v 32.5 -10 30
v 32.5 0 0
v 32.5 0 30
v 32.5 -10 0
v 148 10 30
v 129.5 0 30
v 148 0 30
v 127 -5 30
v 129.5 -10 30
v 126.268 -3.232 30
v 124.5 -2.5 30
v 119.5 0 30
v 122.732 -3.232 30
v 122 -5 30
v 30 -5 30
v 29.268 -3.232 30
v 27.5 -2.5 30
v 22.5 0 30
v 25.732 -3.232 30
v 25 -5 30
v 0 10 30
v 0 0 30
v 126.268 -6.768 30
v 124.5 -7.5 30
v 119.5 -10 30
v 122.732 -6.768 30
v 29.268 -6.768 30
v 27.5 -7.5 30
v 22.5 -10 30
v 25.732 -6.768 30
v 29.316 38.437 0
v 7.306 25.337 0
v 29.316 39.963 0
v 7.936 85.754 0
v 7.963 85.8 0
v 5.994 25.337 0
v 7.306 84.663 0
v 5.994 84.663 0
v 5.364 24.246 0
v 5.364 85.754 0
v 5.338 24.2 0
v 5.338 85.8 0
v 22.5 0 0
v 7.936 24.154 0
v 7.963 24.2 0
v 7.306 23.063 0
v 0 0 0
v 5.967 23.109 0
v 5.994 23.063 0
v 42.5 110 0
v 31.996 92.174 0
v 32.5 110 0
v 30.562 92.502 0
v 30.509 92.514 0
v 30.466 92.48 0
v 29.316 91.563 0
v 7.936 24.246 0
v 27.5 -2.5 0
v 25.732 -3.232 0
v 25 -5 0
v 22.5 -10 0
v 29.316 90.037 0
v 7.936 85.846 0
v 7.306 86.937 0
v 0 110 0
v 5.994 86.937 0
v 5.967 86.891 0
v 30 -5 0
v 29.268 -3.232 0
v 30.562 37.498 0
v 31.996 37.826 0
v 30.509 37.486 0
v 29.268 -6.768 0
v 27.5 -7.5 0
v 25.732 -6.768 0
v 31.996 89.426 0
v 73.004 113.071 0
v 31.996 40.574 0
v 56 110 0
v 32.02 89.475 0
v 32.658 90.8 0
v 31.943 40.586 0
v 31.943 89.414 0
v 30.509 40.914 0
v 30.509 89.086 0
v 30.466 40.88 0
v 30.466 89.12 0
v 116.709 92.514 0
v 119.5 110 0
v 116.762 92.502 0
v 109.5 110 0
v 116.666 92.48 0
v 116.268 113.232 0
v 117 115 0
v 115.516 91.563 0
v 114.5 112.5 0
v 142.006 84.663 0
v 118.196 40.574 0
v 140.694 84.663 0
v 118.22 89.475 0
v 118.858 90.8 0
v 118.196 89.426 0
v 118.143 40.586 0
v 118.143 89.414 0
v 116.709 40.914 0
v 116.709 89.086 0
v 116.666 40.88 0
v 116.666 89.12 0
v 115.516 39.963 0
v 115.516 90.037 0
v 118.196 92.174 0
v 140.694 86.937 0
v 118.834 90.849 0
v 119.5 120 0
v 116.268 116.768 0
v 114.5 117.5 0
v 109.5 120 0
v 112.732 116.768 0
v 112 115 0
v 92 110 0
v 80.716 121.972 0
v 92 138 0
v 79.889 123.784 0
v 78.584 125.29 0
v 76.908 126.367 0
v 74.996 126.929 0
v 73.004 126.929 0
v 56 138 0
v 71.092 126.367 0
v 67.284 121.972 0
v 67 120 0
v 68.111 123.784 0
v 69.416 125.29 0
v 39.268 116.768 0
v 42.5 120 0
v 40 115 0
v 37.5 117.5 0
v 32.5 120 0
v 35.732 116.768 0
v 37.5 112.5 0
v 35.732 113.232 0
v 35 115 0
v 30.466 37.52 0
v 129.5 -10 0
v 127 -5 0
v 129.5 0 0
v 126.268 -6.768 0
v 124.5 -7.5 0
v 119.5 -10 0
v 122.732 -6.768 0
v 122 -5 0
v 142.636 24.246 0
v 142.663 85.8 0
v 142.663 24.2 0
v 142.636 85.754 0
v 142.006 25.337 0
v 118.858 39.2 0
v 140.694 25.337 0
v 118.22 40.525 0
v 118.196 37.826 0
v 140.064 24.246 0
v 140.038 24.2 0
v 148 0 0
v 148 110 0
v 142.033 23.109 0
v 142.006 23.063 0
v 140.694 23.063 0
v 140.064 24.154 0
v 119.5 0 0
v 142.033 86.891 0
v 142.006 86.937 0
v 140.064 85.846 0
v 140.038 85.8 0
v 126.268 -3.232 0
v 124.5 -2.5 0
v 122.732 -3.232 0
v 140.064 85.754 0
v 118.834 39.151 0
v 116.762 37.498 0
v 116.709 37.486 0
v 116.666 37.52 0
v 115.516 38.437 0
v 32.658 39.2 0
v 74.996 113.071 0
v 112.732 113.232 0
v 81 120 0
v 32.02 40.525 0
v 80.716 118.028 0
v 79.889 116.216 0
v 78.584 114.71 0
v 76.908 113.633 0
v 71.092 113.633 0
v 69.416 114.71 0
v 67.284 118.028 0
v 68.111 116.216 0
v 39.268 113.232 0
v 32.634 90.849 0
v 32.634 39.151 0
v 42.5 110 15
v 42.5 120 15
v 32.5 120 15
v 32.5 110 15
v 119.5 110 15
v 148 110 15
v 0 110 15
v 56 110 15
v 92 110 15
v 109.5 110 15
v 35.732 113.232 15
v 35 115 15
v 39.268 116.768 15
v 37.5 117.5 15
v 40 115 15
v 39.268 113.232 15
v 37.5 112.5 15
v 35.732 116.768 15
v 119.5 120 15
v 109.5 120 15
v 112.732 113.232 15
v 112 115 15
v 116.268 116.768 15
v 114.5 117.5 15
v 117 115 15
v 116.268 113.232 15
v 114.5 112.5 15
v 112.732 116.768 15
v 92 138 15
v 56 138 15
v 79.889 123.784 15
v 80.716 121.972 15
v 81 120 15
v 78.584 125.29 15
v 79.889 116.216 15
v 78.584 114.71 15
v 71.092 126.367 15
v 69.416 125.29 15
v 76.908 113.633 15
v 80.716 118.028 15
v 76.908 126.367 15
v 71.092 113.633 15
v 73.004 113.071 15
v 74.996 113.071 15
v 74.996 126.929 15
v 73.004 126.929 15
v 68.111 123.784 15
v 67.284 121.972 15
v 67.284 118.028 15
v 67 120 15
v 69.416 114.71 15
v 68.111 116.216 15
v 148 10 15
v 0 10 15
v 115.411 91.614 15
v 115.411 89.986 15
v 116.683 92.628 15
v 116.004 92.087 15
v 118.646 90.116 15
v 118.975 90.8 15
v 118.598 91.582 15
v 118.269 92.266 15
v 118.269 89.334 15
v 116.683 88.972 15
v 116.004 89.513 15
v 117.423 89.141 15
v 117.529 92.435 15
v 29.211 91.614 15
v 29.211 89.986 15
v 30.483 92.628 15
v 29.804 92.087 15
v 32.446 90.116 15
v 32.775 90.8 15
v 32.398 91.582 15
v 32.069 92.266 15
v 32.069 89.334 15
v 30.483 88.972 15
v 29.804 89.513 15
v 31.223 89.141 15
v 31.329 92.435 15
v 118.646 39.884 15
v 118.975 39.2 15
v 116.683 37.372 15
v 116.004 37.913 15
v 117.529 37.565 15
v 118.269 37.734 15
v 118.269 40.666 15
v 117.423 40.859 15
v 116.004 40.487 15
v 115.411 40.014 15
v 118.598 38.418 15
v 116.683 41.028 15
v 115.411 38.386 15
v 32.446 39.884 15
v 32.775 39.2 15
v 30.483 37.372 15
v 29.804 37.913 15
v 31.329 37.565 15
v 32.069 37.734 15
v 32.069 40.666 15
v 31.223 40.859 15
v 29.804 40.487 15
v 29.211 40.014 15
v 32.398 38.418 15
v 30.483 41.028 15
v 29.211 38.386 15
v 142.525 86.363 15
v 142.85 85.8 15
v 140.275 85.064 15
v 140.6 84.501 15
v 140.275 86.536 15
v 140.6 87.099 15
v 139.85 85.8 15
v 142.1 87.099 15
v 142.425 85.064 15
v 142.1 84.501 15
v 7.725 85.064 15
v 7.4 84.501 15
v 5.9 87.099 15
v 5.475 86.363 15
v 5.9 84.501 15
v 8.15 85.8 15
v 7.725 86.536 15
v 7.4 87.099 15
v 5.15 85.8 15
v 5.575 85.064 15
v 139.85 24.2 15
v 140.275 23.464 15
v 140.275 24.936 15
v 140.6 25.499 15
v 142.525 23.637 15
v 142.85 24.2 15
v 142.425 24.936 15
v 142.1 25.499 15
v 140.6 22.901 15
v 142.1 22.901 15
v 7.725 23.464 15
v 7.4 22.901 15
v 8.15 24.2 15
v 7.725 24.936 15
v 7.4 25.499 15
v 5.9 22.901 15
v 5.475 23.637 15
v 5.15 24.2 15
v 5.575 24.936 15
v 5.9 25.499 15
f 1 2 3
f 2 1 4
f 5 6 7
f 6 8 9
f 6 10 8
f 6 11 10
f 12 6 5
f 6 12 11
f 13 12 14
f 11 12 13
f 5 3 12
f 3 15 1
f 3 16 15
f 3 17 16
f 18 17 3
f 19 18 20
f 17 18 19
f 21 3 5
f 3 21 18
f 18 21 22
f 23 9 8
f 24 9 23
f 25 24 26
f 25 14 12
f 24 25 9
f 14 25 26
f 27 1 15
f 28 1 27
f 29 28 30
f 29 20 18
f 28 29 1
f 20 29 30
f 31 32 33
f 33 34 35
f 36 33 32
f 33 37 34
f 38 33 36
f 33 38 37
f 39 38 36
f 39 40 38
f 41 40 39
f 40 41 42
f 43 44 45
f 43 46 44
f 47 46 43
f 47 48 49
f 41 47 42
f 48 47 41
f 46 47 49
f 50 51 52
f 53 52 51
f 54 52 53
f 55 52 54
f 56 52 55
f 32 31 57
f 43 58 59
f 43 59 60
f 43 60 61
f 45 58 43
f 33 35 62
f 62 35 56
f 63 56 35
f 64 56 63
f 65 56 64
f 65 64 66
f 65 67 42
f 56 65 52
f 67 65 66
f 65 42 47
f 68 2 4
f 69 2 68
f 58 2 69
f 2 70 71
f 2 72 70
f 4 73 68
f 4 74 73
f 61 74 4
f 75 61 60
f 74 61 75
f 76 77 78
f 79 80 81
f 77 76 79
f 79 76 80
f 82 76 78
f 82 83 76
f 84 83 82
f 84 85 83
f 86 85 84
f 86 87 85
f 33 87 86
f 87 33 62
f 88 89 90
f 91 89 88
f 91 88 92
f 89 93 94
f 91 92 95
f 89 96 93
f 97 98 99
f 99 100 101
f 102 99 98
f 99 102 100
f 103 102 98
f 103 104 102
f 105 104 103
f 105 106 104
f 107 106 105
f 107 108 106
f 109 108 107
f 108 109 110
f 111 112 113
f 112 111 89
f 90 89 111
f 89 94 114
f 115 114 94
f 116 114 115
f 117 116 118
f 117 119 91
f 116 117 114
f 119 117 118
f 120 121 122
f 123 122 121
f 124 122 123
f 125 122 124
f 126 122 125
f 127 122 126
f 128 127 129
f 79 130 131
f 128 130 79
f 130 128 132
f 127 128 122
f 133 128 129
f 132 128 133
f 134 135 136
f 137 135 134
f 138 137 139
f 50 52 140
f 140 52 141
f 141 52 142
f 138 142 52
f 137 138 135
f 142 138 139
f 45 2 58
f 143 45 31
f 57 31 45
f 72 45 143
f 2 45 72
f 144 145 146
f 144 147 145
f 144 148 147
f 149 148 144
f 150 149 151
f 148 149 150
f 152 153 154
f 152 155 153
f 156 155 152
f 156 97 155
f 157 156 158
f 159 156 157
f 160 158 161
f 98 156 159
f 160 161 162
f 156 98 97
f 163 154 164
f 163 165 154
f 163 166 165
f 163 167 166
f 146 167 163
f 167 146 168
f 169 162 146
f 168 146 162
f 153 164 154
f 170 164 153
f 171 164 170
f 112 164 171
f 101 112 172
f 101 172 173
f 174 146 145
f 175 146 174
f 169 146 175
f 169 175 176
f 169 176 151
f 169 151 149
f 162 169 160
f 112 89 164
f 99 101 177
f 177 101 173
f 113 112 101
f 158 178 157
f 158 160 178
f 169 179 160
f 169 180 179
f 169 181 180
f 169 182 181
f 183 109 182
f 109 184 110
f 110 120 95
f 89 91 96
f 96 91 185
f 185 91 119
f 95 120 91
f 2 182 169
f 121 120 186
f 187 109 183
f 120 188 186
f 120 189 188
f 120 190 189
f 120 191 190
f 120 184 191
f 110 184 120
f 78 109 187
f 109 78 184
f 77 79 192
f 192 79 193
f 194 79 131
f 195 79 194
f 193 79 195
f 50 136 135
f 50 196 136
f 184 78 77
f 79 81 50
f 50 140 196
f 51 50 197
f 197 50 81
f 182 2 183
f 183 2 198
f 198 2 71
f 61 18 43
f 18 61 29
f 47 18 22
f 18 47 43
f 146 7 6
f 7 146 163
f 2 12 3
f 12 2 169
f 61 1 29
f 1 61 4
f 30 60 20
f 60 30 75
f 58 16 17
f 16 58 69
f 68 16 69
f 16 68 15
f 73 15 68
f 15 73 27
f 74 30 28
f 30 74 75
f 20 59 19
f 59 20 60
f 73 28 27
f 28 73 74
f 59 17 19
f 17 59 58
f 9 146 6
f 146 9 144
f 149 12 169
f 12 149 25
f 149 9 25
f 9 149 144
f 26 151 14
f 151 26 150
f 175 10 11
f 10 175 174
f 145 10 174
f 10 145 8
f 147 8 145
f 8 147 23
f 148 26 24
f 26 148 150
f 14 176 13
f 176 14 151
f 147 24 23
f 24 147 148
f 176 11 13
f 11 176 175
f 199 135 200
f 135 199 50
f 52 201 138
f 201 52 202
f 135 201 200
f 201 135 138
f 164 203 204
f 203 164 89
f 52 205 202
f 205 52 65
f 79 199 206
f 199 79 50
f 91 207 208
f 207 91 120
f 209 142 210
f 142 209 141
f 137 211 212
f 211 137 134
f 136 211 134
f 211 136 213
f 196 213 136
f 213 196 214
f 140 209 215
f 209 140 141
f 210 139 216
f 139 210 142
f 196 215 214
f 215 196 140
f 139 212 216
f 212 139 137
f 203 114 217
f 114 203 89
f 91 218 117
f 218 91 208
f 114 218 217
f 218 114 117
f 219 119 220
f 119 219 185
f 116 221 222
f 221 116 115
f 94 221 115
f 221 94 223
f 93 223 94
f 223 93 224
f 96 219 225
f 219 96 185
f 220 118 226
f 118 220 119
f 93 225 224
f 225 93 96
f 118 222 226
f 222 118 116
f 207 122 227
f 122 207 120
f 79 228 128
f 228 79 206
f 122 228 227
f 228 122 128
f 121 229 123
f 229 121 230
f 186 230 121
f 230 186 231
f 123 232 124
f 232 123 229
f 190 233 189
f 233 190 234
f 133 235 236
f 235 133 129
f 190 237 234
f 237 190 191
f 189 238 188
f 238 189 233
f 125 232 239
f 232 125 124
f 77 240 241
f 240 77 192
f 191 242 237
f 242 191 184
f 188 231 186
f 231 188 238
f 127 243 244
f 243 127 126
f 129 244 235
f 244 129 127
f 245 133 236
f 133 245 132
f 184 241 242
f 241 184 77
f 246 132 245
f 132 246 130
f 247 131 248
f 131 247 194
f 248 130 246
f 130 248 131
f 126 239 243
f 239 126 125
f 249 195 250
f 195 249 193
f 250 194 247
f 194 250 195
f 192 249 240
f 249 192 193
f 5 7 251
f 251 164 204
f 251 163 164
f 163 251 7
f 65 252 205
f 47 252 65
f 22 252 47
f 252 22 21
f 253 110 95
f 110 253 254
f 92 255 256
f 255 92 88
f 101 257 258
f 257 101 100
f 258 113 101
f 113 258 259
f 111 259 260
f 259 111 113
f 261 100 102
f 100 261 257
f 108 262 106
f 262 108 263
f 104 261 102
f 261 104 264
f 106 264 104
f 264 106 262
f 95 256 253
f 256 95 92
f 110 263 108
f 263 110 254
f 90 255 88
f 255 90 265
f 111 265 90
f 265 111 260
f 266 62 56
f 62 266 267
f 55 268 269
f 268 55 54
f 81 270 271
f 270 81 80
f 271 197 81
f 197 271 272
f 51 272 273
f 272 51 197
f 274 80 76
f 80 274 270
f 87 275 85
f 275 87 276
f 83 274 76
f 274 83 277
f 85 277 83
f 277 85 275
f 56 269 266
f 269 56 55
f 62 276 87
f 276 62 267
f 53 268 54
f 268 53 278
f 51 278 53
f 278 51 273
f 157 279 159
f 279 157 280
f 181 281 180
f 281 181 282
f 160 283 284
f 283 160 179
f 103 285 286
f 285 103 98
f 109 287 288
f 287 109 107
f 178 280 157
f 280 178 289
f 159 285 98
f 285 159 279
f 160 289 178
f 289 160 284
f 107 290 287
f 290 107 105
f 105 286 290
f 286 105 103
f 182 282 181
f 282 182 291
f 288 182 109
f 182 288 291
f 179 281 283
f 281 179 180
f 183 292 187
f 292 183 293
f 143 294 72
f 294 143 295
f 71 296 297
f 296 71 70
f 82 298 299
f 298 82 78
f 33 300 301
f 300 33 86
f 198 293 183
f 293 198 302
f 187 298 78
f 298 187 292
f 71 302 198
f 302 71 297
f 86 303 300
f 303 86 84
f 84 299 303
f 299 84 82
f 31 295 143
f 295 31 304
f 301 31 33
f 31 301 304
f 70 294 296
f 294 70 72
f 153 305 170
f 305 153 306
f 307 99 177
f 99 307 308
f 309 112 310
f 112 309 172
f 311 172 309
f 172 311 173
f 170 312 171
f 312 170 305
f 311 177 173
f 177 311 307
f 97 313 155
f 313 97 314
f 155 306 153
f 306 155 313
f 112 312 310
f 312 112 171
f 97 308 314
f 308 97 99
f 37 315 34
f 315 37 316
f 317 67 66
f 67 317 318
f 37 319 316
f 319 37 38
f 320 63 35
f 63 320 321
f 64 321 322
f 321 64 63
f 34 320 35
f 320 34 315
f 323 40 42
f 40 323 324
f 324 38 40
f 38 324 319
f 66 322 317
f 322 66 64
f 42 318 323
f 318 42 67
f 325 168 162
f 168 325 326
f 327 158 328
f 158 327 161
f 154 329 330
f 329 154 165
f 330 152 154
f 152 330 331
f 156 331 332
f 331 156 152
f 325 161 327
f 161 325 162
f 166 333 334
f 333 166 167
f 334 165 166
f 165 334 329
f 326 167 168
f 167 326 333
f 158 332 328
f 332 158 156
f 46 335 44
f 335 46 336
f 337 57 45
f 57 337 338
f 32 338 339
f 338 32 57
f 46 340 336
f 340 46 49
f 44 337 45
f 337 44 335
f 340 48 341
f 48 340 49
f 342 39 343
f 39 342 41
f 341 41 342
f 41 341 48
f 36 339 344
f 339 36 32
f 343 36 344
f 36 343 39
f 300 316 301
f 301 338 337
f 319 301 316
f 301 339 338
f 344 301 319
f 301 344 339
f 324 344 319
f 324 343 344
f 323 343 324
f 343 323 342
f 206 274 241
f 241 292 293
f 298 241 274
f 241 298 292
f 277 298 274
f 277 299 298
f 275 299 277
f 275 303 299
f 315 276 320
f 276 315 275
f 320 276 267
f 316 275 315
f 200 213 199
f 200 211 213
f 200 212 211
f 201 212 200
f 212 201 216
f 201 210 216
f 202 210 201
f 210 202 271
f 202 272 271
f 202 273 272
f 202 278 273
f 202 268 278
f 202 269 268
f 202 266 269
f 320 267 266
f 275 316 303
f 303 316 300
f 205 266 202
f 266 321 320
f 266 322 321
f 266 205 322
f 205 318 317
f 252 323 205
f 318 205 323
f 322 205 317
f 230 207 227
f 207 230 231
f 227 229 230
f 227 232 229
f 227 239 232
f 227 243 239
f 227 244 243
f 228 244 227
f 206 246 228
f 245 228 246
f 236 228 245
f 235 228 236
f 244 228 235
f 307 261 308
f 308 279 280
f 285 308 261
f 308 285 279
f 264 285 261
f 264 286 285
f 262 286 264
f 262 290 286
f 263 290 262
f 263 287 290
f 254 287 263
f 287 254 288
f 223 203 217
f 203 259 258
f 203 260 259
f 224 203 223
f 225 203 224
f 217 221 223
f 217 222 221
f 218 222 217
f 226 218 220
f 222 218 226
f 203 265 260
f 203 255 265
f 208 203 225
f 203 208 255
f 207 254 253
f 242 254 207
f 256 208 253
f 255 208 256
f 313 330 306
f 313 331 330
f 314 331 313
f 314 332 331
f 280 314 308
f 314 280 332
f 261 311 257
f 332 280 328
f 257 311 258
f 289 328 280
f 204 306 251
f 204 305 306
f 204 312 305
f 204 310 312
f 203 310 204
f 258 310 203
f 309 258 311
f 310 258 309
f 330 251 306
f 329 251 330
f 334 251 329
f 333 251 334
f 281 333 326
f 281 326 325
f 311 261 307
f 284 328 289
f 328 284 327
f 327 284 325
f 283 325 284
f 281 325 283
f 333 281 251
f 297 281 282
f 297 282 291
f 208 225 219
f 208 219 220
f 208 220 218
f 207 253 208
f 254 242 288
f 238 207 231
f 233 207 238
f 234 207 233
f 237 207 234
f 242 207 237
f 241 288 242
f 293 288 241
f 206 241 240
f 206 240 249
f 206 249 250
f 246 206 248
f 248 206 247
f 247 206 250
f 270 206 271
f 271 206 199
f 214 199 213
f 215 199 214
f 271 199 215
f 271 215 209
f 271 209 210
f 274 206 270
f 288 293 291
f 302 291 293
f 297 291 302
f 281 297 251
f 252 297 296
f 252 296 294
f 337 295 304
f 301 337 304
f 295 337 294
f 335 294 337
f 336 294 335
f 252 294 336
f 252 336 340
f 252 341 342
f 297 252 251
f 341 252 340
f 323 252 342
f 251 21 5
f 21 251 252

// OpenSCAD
sdr_width=103;
sdr_height=71.5;
sdr_depth=26;

base=2; // w and d
base_h=5;

offset=10;

strap_w=30;
strap_h=2;
stack_width=sdr_width/4-offset/2;
tol=0.05;
    
hook_out=5;
hook_in=2.5;

array_width=148;
array_height=110;
array_depth=30;

array_screw_hole_width1=1.75; //r screw
array_screw_hole_width2=2; //r screw

poe_screw_hole_width1=1.3; //r screw
poe_screw_hole_width2=1.7; //r screw

array_hole_out=18;
array_hole_in=7;
    
    
module hollow_cylinder(out,in,height) {
    difference() {
        //cylinder(height,out,out);
        translate([-out,-out,0]) cube([out*2,out*2,height]);
        cylinder(height,in,in);
    }
}
module sdr_box() {
    cube([sdr_width+base*2, sdr_height+base_h*2, sdr_depth+base]);
    
    translate([sdr_width/2-stack_width/2+base,-strap_h/2+base_h/2,base]) cube([stack_width,strap_h,sdr_depth+offset/4]);
    
    translate([sdr_width/2-stack_width/2+base,base_h+base_h/2-strap_h/2+sdr_height,base]) cube([stack_width,strap_h,sdr_depth+offset/4]);
}
    
module sdr_cutout() {
            //base
            translate([base,base_h,base]) difference() {
                union() {
                    cube([sdr_width, sdr_height, sdr_depth]);
                    translate([-base*2,offset/2,0]) cube([sdr_width+base*4, sdr_height-offset, sdr_depth]);
                }
            }

            //velcro straps
            for (i = [1,3]) {
                    translate([i*(sdr_width+base*2)/4-strap_w/2,base_h/2-strap_h/2,-offset/2]) cube([strap_w,strap_h,sdr_depth+base+offset]);
                    translate([i*(sdr_width+base*2)/4-strap_w/2,base_h+base_h/2-strap_h/2+sdr_height,-offset/2]) cube([strap_w,strap_h,sdr_depth+base+offset]);
                    
            }

        
        translate([sdr_width/2-stack_width/2+base-tol,-strap_h/2+base_h/2-tol,0]) cube([stack_width+tol*2,strap_h+tol*2,offset]);
            
        translate([sdr_width/2-stack_width/2+base-tol,base_h+base_h/2-strap_h/2+sdr_height-tol,0]) cube([stack_width+tol*2,strap_h+tol*2,offset]);
}


module ziptie_points(height,depth) {
    translate([hook_out,-hook_out]) hollow_cylinder(hook_out,hook_in,height=depth);
    translate([sdr_width+base*2-hook_out,-hook_out]) hollow_cylinder(hook_out,hook_in,height=depth);
    //height=sdr_height+base_h*2;
    translate([hook_out*3,hook_out+height]) hollow_cylinder(hook_out,hook_in,height=depth);
    translate([sdr_width+base*2-3*hook_out,hook_out+height]) hollow_cylinder(hook_out,hook_in,height=depth);
}

module sdr_unit() {
    difference() {
        sdr_box();
        sdr_cutout();
    }
    ziptie_points(height=sdr_height+base_h*2, depth=sdr_depth+base);
}



module holes(xp,yp,r1,r2) {
    for (y = [xp/2,-xp/2]) {
        for (x=[yp/2, -yp/2]) {
            translate([x,y,-1]) cylinder(h=array_depth+2,r1=r1,r2=r2);
        }
    }
}

module array_mount() {
    difference() {
        union() {
            cube([array_width,array_height,array_depth]); 
            translate([(array_width-sdr_width)/2,0,0]) ziptie_points(height=array_height,depth=array_depth);
            translate([array_width/2,array_height+10]) hollow_cylinder(array_hole_out,array_hole_in,array_depth);
        }
        translate([array_width/2,array_height/2+10]) holes(51.6,86.2,array_screw_hole_width1,array_screw_hole_width2); //antenna mount
        translate([array_width/2,array_height/2]) holes(61.6,134.7,poe_screw_hole_width1,poe_screw_hole_width2); //poe
        
        translate([0,10,array_depth/2]) cube([array_width,array_height*2,array_depth/2]);
    }

}

//sdr_unit();

        
array_mount();
